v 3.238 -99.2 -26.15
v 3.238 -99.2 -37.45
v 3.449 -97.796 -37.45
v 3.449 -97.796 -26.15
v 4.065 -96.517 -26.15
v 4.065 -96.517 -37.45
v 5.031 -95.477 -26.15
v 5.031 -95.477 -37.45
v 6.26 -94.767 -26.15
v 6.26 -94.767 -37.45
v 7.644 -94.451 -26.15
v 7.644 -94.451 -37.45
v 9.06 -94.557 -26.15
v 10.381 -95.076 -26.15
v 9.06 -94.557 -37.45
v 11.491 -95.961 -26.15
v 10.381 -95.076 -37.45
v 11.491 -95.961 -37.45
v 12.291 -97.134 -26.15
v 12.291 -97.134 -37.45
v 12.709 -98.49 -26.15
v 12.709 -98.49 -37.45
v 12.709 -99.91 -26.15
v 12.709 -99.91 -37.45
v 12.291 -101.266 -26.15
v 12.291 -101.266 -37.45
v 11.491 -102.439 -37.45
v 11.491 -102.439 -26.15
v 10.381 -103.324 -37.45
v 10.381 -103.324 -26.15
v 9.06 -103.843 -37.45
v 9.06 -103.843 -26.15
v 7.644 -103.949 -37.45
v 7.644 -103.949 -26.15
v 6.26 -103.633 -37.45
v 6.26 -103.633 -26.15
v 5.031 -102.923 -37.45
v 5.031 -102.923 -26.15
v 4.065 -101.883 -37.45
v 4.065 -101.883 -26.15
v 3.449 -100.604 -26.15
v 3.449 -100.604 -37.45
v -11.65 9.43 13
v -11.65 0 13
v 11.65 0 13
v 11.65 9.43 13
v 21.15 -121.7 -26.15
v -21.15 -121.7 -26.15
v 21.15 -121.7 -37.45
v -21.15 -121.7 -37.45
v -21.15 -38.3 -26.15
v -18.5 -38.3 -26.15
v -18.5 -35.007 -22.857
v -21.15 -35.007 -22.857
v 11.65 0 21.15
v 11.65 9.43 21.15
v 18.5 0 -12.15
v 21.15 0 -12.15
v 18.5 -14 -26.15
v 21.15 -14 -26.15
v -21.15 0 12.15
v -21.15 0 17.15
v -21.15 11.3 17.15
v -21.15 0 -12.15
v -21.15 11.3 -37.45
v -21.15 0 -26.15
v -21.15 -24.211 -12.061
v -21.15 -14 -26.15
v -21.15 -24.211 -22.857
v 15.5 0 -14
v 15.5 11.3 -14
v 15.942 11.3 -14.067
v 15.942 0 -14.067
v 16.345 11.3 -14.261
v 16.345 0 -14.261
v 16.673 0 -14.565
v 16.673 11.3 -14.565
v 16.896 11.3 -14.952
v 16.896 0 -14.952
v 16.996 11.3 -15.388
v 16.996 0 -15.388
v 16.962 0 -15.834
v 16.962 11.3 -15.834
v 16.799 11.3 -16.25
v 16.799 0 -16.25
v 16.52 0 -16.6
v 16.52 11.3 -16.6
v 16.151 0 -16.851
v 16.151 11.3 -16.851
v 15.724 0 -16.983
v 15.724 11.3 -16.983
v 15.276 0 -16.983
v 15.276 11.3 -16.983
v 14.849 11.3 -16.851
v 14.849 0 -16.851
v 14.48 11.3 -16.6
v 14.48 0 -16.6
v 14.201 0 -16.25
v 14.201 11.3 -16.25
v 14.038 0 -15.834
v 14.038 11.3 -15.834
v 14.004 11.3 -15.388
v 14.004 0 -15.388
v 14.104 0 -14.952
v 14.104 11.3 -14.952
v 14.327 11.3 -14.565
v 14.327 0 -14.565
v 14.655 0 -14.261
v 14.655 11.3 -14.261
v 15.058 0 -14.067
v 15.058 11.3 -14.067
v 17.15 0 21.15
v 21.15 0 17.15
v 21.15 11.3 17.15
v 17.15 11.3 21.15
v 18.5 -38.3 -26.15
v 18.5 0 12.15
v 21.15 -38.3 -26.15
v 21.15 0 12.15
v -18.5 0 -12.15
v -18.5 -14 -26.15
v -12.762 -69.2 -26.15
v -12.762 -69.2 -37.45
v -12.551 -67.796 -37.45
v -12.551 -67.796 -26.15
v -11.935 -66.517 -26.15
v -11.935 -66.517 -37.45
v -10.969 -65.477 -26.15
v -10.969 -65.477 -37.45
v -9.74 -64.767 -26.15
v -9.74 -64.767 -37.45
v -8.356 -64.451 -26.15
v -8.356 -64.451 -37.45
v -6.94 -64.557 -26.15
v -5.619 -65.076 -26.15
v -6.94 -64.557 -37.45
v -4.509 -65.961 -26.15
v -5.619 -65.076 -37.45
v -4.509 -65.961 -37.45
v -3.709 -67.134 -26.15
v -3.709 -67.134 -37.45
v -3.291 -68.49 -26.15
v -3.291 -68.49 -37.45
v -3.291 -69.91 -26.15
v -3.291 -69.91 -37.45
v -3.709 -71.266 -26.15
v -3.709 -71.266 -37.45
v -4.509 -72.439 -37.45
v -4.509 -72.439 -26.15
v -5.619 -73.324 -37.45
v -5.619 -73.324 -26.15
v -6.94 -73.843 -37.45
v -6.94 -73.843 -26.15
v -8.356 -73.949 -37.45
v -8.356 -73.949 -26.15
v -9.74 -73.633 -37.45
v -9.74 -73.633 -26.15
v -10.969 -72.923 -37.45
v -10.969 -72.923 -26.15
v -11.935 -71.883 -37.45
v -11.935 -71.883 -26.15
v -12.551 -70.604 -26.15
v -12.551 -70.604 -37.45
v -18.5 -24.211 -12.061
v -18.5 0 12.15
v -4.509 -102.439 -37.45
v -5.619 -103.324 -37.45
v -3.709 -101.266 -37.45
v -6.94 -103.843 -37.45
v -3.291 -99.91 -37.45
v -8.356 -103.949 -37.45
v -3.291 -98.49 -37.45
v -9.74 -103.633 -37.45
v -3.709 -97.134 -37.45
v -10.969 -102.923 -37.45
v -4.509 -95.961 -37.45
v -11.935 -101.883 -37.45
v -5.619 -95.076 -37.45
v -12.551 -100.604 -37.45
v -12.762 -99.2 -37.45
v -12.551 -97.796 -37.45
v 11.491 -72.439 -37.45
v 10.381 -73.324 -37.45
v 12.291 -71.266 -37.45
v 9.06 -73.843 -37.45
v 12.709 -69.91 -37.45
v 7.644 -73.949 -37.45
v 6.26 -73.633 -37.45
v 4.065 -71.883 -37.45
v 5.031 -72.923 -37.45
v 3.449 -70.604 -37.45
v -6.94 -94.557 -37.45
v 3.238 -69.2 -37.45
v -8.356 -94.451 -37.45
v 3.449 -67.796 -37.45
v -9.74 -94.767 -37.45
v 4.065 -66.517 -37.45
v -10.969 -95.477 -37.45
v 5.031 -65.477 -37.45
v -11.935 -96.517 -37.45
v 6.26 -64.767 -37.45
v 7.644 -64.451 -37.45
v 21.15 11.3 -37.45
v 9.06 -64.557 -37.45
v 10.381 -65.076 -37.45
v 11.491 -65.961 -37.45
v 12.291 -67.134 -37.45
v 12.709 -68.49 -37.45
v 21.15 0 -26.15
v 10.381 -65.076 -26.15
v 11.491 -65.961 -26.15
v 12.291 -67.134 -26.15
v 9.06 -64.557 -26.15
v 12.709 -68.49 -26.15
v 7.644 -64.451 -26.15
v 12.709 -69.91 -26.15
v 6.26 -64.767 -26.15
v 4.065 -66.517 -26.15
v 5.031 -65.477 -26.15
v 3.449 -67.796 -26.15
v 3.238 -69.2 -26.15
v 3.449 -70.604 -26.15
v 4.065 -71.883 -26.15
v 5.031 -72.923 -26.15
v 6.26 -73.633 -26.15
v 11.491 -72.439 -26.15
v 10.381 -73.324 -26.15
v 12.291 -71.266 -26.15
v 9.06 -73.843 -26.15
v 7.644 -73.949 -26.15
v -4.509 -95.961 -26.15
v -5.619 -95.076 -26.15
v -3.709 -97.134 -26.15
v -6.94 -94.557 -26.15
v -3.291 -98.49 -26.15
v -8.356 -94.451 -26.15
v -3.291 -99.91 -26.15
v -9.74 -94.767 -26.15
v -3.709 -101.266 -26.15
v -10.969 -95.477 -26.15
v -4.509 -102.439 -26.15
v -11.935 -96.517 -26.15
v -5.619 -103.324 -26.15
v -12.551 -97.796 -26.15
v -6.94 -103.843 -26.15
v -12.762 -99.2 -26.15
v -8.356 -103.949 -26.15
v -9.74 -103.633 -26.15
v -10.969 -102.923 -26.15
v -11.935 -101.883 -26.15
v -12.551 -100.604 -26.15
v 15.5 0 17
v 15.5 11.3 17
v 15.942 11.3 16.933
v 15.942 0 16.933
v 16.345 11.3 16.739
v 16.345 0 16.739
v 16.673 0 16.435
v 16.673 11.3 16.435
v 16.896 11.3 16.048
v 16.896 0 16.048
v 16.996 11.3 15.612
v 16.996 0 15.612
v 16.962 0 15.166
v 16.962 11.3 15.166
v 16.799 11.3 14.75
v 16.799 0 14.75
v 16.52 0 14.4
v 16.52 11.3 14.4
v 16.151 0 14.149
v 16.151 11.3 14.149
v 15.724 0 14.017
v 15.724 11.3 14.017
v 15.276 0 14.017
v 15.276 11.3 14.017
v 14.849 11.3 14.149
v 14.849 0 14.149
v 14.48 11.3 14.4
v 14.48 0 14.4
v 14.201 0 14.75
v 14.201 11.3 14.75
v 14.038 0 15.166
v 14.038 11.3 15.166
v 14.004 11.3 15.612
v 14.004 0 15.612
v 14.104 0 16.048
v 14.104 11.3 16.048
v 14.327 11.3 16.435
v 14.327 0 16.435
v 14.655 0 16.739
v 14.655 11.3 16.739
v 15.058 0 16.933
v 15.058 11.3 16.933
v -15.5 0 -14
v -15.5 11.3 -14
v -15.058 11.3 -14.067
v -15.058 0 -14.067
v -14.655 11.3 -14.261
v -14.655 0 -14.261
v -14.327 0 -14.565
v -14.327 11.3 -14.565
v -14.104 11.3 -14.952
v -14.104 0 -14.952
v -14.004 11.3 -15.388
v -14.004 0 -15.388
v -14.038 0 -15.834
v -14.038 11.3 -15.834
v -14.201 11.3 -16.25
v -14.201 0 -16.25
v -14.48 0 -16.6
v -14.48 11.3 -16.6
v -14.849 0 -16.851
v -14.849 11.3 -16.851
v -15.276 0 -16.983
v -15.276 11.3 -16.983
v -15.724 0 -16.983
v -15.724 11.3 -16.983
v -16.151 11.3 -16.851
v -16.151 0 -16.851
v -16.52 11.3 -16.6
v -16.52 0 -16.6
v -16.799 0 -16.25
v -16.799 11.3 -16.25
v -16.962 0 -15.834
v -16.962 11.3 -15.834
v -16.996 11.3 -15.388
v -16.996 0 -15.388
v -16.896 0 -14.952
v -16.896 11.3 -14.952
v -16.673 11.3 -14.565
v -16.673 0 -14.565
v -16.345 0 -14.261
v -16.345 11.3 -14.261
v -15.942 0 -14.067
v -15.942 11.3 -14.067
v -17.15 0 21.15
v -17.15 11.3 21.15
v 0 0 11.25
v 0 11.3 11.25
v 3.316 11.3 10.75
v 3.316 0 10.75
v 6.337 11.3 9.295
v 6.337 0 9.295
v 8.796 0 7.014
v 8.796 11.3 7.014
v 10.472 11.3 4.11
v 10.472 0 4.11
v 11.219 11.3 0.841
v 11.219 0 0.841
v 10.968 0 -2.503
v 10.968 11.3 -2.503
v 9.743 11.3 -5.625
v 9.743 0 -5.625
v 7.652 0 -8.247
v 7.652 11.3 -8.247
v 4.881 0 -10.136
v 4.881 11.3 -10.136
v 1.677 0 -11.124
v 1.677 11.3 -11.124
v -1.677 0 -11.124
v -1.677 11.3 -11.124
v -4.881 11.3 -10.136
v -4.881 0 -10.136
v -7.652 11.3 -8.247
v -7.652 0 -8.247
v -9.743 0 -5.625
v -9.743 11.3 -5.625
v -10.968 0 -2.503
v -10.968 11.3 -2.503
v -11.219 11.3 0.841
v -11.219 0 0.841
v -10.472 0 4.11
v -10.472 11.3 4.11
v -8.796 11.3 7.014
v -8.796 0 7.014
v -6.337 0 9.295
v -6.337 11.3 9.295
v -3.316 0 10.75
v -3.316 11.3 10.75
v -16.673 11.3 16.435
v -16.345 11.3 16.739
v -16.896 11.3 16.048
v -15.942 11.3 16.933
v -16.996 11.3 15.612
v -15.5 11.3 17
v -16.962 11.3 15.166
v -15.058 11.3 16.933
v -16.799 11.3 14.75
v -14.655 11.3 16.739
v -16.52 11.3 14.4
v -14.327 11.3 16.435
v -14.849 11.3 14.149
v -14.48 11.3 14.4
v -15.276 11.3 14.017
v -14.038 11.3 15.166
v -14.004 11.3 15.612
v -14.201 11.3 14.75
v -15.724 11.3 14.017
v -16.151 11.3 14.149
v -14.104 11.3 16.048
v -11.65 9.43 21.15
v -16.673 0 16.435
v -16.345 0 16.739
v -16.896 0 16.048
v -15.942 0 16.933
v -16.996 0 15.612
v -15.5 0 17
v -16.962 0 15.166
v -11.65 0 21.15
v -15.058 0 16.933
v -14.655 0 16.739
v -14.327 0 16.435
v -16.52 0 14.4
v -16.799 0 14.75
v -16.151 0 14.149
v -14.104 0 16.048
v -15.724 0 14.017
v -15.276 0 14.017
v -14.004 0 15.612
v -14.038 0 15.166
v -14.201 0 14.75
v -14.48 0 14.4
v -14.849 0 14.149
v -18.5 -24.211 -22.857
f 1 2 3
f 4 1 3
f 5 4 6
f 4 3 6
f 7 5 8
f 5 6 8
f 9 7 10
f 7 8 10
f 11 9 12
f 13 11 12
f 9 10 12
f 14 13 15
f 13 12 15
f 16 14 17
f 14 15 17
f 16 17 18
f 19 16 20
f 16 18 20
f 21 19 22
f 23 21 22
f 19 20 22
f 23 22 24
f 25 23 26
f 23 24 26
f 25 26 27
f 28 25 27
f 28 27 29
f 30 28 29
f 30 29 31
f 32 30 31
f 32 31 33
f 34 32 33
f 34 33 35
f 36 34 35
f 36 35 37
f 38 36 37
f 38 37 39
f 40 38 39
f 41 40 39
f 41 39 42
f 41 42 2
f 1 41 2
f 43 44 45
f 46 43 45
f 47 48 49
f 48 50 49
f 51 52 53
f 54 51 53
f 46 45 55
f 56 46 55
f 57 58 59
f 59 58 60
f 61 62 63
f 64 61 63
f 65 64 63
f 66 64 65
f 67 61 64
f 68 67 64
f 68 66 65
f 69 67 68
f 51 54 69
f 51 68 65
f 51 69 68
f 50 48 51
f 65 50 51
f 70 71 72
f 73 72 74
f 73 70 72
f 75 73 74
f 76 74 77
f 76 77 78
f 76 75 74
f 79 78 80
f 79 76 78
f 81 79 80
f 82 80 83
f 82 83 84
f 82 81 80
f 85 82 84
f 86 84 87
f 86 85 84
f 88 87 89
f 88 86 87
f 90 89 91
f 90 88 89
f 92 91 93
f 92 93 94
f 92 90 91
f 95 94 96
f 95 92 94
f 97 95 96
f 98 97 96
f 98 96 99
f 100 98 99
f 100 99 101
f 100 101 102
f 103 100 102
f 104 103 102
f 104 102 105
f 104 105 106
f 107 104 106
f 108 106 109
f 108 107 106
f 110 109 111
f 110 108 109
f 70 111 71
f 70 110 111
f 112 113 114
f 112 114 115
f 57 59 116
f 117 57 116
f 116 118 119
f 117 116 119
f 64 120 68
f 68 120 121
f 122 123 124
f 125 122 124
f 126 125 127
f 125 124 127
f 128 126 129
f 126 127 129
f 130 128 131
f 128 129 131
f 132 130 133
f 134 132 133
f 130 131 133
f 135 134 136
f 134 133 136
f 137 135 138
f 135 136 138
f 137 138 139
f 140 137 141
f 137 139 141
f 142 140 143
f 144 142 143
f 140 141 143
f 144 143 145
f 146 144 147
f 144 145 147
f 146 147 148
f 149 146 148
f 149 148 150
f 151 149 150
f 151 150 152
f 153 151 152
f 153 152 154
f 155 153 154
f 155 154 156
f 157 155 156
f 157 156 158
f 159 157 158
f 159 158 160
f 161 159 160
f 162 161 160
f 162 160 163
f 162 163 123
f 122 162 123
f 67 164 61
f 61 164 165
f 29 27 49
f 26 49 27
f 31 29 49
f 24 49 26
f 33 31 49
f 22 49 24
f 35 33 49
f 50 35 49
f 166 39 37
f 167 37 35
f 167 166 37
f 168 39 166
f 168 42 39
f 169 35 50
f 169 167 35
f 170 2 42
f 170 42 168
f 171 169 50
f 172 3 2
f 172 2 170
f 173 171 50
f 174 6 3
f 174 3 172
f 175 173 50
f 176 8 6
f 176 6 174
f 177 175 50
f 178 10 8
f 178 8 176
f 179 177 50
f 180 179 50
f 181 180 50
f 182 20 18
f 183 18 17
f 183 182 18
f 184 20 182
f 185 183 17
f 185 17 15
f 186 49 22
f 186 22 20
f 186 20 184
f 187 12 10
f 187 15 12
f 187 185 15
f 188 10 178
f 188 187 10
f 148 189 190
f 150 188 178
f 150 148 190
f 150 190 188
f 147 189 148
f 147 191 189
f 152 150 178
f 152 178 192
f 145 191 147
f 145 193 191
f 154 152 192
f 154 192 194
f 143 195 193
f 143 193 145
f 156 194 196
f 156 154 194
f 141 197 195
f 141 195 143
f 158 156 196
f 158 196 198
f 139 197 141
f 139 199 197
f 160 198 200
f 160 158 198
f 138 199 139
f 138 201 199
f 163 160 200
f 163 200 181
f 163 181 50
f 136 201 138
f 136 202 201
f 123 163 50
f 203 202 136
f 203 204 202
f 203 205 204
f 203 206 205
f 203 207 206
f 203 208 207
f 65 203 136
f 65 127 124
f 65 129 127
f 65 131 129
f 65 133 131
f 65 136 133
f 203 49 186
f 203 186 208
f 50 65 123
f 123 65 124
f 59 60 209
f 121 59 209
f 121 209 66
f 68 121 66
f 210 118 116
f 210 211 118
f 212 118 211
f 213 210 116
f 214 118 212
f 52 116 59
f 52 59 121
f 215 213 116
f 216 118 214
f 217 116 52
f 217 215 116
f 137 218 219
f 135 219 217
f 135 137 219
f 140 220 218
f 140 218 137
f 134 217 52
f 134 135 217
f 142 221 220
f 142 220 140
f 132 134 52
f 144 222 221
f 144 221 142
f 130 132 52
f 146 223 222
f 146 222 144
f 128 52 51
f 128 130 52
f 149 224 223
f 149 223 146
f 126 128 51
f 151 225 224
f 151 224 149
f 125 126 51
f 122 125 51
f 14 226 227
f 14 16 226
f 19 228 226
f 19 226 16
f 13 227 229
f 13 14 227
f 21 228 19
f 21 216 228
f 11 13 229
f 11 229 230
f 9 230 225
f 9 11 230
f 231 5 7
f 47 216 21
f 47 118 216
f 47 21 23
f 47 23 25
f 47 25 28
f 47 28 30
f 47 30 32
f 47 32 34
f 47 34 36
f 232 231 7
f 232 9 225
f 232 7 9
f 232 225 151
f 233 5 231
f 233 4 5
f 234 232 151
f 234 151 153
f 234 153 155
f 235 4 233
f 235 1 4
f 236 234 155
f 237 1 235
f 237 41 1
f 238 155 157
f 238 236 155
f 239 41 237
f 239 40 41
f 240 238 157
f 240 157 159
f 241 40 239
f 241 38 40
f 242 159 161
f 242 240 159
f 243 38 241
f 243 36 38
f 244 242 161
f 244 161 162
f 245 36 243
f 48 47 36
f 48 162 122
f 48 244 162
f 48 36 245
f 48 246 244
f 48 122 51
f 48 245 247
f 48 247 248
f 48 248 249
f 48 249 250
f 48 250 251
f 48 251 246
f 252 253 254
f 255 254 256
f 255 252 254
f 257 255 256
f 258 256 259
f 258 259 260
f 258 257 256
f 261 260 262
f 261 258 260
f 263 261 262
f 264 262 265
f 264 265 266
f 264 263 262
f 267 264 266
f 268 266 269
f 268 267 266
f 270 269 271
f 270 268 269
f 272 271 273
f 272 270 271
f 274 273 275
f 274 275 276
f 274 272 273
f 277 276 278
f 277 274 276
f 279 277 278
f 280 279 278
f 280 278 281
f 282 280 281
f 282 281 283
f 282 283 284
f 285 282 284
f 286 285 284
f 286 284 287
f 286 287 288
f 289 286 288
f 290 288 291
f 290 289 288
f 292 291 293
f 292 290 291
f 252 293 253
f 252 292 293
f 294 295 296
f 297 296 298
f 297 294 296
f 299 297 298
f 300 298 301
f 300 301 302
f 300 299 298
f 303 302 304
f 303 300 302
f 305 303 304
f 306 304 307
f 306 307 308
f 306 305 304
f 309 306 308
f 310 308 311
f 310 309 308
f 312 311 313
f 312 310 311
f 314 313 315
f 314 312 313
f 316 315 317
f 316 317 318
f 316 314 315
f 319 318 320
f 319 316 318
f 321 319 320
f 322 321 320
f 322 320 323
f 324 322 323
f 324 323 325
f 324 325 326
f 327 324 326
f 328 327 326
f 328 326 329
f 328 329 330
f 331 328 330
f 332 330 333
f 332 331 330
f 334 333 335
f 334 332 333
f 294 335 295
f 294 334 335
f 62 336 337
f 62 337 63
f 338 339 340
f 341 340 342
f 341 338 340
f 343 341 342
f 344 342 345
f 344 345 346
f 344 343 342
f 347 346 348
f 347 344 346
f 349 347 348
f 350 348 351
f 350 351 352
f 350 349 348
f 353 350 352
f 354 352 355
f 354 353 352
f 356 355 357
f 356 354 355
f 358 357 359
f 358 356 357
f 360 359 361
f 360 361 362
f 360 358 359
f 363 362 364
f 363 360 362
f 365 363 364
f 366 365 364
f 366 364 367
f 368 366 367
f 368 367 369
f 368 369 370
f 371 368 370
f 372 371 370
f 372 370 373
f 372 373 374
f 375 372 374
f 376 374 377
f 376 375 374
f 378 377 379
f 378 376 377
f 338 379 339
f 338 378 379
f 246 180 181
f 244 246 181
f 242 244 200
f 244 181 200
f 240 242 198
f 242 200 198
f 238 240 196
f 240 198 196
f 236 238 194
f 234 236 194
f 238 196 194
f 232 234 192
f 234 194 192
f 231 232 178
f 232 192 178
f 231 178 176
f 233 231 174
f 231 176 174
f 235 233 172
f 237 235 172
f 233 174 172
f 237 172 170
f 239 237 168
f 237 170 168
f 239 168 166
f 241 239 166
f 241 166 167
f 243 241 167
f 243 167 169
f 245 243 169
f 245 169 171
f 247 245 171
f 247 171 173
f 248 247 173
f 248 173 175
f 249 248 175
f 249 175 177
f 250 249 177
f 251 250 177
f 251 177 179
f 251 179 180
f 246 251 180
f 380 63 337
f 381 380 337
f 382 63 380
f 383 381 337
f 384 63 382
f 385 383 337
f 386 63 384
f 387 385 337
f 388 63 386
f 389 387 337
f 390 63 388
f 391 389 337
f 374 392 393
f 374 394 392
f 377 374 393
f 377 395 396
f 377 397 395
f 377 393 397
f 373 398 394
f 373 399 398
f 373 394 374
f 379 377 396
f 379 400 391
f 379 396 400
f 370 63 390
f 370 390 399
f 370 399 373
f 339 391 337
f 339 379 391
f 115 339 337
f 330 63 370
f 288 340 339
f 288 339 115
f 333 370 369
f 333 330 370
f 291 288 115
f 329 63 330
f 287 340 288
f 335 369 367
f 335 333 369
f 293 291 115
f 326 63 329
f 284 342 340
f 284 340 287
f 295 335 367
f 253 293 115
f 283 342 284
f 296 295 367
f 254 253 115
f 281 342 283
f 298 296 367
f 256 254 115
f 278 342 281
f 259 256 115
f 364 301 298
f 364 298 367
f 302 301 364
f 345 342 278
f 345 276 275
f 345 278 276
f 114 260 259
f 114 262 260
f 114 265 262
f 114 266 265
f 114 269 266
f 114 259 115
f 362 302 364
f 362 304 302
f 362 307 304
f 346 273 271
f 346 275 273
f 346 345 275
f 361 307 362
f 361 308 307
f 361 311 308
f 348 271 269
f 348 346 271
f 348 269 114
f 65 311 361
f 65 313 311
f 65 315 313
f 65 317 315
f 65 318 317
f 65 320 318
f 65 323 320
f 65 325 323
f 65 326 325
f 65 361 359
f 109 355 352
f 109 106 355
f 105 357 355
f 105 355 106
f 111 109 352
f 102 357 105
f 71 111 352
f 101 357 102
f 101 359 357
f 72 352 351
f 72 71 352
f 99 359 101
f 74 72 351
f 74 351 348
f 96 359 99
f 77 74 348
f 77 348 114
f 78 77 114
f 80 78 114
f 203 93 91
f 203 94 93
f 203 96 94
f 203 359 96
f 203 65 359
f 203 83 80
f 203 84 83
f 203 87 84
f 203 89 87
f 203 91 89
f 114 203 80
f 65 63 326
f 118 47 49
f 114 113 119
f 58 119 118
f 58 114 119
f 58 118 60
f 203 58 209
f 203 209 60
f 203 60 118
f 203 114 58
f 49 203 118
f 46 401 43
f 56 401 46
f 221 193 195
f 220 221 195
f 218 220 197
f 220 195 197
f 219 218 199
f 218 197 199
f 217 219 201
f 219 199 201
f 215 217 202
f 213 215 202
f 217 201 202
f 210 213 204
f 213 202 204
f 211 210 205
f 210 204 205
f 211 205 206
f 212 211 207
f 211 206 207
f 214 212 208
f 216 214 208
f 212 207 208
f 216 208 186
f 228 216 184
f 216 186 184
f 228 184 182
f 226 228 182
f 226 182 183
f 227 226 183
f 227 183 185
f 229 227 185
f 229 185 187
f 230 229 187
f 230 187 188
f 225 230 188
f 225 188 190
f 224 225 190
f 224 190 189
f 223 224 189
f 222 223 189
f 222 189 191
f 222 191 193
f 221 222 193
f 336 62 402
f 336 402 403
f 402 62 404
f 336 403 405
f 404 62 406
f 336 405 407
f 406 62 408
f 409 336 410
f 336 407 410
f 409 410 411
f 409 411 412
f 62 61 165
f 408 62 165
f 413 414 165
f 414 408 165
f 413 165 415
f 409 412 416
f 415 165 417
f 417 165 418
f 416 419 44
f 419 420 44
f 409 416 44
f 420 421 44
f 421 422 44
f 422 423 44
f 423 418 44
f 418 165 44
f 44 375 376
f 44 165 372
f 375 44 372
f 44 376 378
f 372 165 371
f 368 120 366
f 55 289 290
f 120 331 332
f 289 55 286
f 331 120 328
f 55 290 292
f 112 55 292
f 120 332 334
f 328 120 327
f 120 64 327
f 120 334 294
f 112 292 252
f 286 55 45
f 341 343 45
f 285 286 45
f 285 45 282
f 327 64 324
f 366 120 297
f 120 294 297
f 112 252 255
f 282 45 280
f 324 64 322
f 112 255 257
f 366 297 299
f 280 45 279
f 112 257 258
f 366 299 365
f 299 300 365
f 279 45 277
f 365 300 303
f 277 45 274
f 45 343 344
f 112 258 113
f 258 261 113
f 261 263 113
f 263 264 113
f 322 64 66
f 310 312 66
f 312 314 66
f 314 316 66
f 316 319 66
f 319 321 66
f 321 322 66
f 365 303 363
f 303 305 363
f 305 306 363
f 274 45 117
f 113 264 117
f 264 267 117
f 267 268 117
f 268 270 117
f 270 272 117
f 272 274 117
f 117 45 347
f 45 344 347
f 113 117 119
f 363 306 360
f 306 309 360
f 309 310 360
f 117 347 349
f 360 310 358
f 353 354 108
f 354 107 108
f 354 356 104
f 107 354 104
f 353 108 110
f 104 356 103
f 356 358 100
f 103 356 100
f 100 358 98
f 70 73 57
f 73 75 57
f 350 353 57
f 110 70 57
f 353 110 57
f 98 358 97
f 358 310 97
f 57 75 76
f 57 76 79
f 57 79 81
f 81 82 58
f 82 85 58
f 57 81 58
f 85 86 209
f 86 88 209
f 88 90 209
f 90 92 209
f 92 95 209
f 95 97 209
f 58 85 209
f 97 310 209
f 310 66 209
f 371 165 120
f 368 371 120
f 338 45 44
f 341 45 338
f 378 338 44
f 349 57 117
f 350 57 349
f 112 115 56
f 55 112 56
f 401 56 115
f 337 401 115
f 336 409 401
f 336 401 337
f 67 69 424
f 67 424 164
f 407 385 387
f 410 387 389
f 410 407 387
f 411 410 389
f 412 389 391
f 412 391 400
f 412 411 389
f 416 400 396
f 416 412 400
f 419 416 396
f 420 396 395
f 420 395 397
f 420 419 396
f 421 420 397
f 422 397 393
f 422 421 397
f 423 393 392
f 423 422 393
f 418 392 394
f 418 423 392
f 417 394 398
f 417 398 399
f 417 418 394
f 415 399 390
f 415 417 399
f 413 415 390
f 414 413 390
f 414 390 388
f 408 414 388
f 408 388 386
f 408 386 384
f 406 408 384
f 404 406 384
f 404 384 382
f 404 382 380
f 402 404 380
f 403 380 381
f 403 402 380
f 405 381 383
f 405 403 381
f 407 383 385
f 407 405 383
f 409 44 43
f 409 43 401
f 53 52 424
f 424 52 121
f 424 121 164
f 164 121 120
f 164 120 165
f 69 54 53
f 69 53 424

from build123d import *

# Parameters (mm, degrees)
SKETCH1_R           = 11.25
SKETCH1_R_2         = 1.5
BOSS_EXTRUDE1_DEPTH = 11.3
SKETCH4_W           = 34.3
SKETCH4_H           = 11.3
BOSS_EXTRUDE3_DEPTH = 5
BOSS_EXTRUDE4_DEPTH = 11.3
SKETCH6_W           = 34.3
SKETCH6_H           = 133
BOSS_EXTRUDE5_DEPTH = 11.3
BOSS_EXTRUDE6_DEPTH = 133
CUT_EXTRUDE1_DEPTH  = 121.7
BOSS_EXTRUDE8_DEPTH = 2.65
BOSS_EXTRUDE9_DEPTH = 2.65
SKETCH13_R          = 4.7625
CUT_EXTRUDE2_DEPTH  = 137.719320142
SKETCH14_W          = 23.3
SKETCH14_H          = 8.15
CUT_EXTRUDE3_DEPTH  = 9.43
CUT_EXTRUDE4_DEPTH  = 2.65


with BuildPart() as part:
    # Sketch1 → Boss-Extrude1 (new body)
    with BuildSketch(Plane(origin=(0, 0, 0), x_dir=(1, 0, 0), z_dir=(0, 1, 0))):
        Polygon((-21.15, 17.15), (-17.15, 21.15), (17.15, 21.15), (21.15, 17.15), (21.15, -17.15), (17.15, -21.15), (-17.15, -21.15), (-21.15, -17.15), align=None)
        with Locations(Location((0, 0, 0), (0, 0, 270))):
            Circle(SKETCH1_R, mode=Mode.SUBTRACT)
        with Locations(Location((-15.5, 15.5, 0), (0, 0, 270))):
            Circle(SKETCH1_R_2, mode=Mode.SUBTRACT)
        with Locations(Location((15.5, 15.5, 0), (0, 0, 270))):
            Circle(SKETCH1_R_2, mode=Mode.SUBTRACT)
        with Locations(Location((15.5, -15.5, 0), (0, 0, 270))):
            Circle(SKETCH1_R_2, mode=Mode.SUBTRACT)
        with Locations(Location((-15.5, -15.5, 0), (0, 0, 270))):
            Circle(SKETCH1_R_2, mode=Mode.SUBTRACT)
    extrude(amount=BOSS_EXTRUDE1_DEPTH)

    # Sketch4 → Boss-Extrude3 (add)
    with BuildSketch(Plane(origin=(0, 0, -21.15), x_dir=(-1, 0, 0), z_dir=(0, 0, -1))):
        with Locations((0, 5.65)):
            Rectangle(SKETCH4_W, SKETCH4_H)
    extrude(amount=BOSS_EXTRUDE3_DEPTH)

    # Sketch5 → Boss-Extrude4 (add)
    with BuildSketch(Plane(origin=(0, 11.3, 0), x_dir=(1, 0, 0), z_dir=(0, 1, 0))):
        Polygon((21.15, 17.15), (17.15, 26.15), (17.15, 21.15), align=None)
        Polygon((-17.15, 26.15), (-21.15, 17.15), (-17.15, 21.15), align=None)
    extrude(amount=-BOSS_EXTRUDE4_DEPTH)

    # Sketch6 → Boss-Extrude5 (add)
    with BuildSketch(Plane(origin=(0, 0, -26.15), x_dir=(-1, 0, 0), z_dir=(0, 0, -1))):
        with Locations((0, -55.2)):
            Rectangle(SKETCH6_W, SKETCH6_H)
    extrude(amount=BOSS_EXTRUDE5_DEPTH)

    # Sketch9 → Boss-Extrude6 (add)
    with BuildSketch(Plane(origin=(0, 11.3, 0), x_dir=(1, 0, 0), z_dir=(0, 1, 0))):
        Polygon((21.15, 17.15), (21.15, 37.45), (17.15, 37.45), (17.15, 26.15), align=None)
        Polygon((-17.15, 37.45), (-17.15, 26.15), (-21.15, 17.15), (-21.15, 37.45), align=None)
    extrude(amount=-BOSS_EXTRUDE6_DEPTH)

    # Sketch10 → Cut-Extrude1 (cut)
    with BuildSketch(Plane.XZ.offset(121.7)):
        Polygon((-17.15, -26.15), (-21.15, -17.15), (-21.15, -26.15), align=None)
        Polygon((17.15, -26.15), (21.15, -17.15), (21.15, -26.15), align=None)
    extrude(amount=-CUT_EXTRUDE1_DEPTH, mode=Mode.SUBTRACT)

    # Sketch11 → Boss-Extrude8 (add)
    with BuildSketch(Plane.ZY.offset(18.5)):
        Polygon((-26.15, -38.3), (12.15, 0), (-12.15, 0), (-26.15, -14), align=None)
    extrude(amount=BOSS_EXTRUDE8_DEPTH)

    # Sketch12 → Boss-Extrude9 (add)
    with BuildSketch(Plane(origin=(21.15, 0, 0), x_dir=(0, 0, -1), z_dir=(1, 0, 0))):
        Polygon((-12.15, 0), (12.15, 0), (26.15, -14), (26.15, -38.3), align=None)
    extrude(amount=-BOSS_EXTRUDE9_DEPTH)

    # Sketch13 → Cut-Extrude2 (cut, through all)
    with BuildSketch(Plane(origin=(0, 0, -37.45), x_dir=(-1, 0, 0), z_dir=(0, 0, -1))):
        with Locations((8, -69.2)):
            Circle(SKETCH13_R)
        with Locations((-8, -69.2)):
            Circle(SKETCH13_R)
        with Locations((8, -99.2)):
            Circle(SKETCH13_R)
        with Locations((-8, -99.2)):
            Circle(SKETCH13_R)
    extrude(amount=-CUT_EXTRUDE2_DEPTH, mode=Mode.SUBTRACT)

    # Sketch14 → Cut-Extrude3 (cut)
    with BuildSketch(Plane.XZ):
        with Locations((0, 17.075)):
            Rectangle(SKETCH14_W, SKETCH14_H)
    extrude(amount=-CUT_EXTRUDE3_DEPTH, mode=Mode.SUBTRACT)

    # Sketch15 → Cut-Extrude4 (cut)
    with BuildSketch(Plane.ZY.offset(21.15)):
        Polygon((-22.8566684, -35.0066684), (-22.8566684, -24.211458174), (-12.061458174, -24.211458174), align=None)
    extrude(amount=-CUT_EXTRUDE4_DEPTH, mode=Mode.SUBTRACT)


solid = part.part
